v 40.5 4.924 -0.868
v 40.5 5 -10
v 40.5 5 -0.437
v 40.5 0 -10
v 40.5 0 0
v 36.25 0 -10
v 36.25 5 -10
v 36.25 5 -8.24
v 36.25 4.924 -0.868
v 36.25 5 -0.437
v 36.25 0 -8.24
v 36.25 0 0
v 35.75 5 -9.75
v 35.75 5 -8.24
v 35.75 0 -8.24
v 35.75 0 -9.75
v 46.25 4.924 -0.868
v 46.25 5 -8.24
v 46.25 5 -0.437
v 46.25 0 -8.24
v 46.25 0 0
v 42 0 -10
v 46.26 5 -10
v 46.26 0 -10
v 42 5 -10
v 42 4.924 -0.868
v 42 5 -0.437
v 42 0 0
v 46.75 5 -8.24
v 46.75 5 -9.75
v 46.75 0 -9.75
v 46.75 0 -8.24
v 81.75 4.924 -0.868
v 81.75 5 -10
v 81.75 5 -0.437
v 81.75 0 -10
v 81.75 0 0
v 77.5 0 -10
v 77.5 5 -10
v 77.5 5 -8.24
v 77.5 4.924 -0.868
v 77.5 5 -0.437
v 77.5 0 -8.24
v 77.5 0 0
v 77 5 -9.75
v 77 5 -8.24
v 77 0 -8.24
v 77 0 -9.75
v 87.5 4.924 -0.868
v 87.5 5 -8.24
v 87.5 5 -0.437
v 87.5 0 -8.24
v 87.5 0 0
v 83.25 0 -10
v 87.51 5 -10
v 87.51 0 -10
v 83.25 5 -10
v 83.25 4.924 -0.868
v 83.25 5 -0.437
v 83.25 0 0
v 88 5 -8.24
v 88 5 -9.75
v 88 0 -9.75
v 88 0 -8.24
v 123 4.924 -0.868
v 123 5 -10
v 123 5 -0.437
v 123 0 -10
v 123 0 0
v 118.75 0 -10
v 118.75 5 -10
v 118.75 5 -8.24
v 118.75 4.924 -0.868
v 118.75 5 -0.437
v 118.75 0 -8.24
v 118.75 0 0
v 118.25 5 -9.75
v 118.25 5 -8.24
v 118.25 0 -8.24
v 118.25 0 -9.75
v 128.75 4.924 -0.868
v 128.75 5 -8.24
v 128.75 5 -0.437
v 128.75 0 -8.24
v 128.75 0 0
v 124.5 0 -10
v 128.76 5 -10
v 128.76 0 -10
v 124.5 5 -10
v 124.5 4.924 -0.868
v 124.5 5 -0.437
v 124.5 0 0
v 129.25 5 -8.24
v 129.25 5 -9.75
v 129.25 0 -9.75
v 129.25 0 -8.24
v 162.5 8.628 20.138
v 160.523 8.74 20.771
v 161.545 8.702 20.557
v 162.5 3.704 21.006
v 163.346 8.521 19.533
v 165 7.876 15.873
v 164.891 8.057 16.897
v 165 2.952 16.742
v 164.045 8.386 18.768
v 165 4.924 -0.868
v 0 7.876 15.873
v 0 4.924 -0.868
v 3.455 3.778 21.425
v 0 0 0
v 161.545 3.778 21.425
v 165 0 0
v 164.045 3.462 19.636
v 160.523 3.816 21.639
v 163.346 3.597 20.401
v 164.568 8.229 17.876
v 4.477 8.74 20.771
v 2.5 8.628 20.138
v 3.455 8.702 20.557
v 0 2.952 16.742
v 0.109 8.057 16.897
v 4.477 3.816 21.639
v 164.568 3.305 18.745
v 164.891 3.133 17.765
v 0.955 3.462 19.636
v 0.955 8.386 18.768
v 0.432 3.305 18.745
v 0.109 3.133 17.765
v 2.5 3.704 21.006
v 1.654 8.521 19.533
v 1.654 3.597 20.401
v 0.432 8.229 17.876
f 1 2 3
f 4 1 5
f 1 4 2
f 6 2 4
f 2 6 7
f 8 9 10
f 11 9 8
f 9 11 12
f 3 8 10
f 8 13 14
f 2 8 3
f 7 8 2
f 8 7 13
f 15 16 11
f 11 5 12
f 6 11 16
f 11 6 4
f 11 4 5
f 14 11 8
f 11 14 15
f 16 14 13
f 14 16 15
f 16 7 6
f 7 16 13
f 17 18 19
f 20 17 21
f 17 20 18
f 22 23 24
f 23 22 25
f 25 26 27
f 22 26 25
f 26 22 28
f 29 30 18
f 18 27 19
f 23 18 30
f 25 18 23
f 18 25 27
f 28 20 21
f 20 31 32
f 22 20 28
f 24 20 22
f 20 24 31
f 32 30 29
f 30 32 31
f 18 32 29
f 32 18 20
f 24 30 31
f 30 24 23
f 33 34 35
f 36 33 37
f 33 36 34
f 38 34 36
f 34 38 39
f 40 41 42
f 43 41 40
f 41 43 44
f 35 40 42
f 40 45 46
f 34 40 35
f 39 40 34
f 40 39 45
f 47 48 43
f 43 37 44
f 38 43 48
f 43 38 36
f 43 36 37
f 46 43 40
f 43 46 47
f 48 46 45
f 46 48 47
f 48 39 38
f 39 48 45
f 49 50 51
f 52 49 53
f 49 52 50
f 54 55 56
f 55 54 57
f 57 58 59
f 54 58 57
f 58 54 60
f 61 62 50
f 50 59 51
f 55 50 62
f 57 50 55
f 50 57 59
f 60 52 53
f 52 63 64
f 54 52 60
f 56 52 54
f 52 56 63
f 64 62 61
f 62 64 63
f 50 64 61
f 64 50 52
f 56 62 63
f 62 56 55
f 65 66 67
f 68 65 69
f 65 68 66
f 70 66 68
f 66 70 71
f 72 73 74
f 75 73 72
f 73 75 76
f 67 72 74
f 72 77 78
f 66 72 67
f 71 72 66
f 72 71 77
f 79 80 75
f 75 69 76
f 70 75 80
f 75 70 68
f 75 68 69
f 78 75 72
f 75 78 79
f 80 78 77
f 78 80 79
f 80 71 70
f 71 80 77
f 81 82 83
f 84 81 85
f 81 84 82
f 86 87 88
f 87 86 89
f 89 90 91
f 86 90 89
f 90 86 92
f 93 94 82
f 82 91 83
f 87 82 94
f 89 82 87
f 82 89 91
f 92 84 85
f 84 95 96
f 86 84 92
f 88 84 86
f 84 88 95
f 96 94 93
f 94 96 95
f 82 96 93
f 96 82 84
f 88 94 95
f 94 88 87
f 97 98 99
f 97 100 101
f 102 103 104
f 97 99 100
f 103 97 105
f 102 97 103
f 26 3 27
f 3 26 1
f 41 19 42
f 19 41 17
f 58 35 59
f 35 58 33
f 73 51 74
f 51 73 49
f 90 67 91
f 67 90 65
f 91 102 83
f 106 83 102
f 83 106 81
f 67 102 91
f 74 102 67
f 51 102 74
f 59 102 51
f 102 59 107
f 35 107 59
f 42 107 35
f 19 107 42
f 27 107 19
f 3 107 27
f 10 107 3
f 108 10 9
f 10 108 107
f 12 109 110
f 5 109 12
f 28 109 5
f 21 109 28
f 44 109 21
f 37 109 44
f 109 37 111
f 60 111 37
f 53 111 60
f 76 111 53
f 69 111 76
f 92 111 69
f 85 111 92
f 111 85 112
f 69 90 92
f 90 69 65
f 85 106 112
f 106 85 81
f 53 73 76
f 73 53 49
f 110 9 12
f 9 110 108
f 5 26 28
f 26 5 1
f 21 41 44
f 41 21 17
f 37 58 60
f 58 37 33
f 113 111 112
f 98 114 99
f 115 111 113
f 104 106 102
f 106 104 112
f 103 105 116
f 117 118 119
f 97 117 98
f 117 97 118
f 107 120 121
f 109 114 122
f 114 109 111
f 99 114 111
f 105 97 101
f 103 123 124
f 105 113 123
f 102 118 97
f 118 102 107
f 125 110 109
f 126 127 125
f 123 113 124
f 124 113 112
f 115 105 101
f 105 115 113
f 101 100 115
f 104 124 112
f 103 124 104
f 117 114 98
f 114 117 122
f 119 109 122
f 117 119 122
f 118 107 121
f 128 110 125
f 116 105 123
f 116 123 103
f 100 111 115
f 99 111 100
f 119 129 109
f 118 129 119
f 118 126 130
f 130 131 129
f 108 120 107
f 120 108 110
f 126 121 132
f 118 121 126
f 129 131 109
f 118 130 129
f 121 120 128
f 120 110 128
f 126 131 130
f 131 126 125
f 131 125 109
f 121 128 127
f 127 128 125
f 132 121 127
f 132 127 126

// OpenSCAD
// file: config.scad
// ============================================
// Tempest Schachuhr - Gemeinsame Konfiguration
// ============================================
// Alle Masse in mm

// --- Druckbett-Limit ---
druckbett = 220; // Ender 3: 220x220mm

// --- FDM Toleranzen ---
tol = 0.25;       // Allgemeine Passtoleranz
tol_tight = 0.15; // Enge Passung (Snap-fit)
tol_loose = 0.35; // Lose Passung (leichtgaengig)

// --- Gesamtabmessungen Basis ---
basis_laenge = 210;
basis_breite = 100;
basis_hoehe  = 25;
basis_wand   = 4;       // Wandstaerke
basis_radius = 5;       // Kantenverrundung

// --- Pivot (Wippenlager) ---
pivot_radius    = 2;    // Halbrundes Profil
pivot_breite    = basis_breite - 2*basis_wand; // Steg laeuft von Wand zu Wand
pivot_hoehe_auf_basis = basis_hoehe - basis_wand; // Oberkante Basis-Innenwand

// --- Vorab-Definitionen (benoetigt fuer anschlag_hoehe) ---
wippe_nut_tiefe  = 2.5;
boden_dicke      = 2;

// --- Anschlaege ---
anschlag_abstand = 70;  // Abstand vom Pivot zum Anschlag (mm)
anschlag_breite  = 10;
anschlag_tiefe   = 4;
kipp_winkel      = 5;   // Max. Kippwinkel in Grad
// Berechnete Hoehe (vom Boden bis Kipp-Limit)
anschlag_hoehe   = (basis_hoehe + pivot_radius - wippe_nut_tiefe)
                   - anschlag_abstand * sin(kipp_winkel)
                   - boden_dicke;

// --- Wippe ---
wippe_kipp_freiraum = 1.5; // Extra Kuerzung pro Seite fuer Kippbewegung (mm)
wippe_laenge = basis_laenge - 2 * (basis_wand + tol_loose + wippe_kipp_freiraum);
wippe_breite = basis_breite - 2 * (basis_wand + tol_loose);
wippe_hoehe  = 8;
wippe_nut_radius = pivot_radius + tol; // V-Nut passend zum Pivot
fase_oben        = 1;           // 45°-Fase an Wippe-Oberkanten (Freiraum beim Kippen)

// --- Verstaerkung Wippe-Mitte (Buckel nach unten) ---
verstaerkung_breite = 30;  // Breite der Verdickung entlang X (um Pivot-Mitte)
verstaerkung_hoehe  = 4;   // Wie weit der Buckel nach unten ragt

// --- Smartphone-Schlitz ---
// Schlitz laeuft laengs entlang der X-Achse (wie beim Tempest-Original)
slot_laenge = 165;      // Laenge des Schlitzes (entlang X / Laengsachse)
slot_breite = 12;       // Breite des Schlitzes (entlang Y / Handy-Dicke)
slot_offset_y = 15;     // Schlitz-Versatz nach hinten (Y+) vom Zentrum
lehne_hoehe = 22;       // Rueckenlehne hinter dem Schlitz (Handy lehnt dagegen)
lehne_dicke = 5;        // Wandstaerke der Rueckenlehne
lehne_winkel = 10;      // Neigung nach hinten in Grad

// --- Lehne Steckverbindung (Spreizzapfen mit Rastnasen) ---
lehne_zapfen_laenge = 10;   // Zapfenlaenge in X (mm)
lehne_zapfen_tiefe  = 10;   // Gesamtlaenge Zapfen (laenger als Wippe fuer Snap)
lehne_zapfen_anzahl = 3;    // Anzahl Zapfen
lehne_zapfen_spalt  = 1.5;  // Spalt zwischen Zapfen-Haelften (mm)
lehne_zapfen_nub    = 0.5;  // Rastnase Ueberstand (mm)
lehne_zapfen_nub_h  = 1.5;  // Rastnase Hoehe (mm)

// --- Handy-Tasche (haengt unter der Wippe, wippt mit) ---
tasche_tiefe    = 12;   // Wie tief die Tasche unter der Wippe haengt
tasche_wand     = 2;    // Wandstaerke der Tasche
tasche_boden    = 2;    // Bodendicke im Schlitz (Handy steht darauf)

// --- Gummifuesse ---
fuss_durchmesser = 10;
fuss_hoehe       = 2;
fuss_abstand_x   = 15;  // Abstand vom Rand
fuss_abstand_y   = 15;

// --- Farben fuer Assembly ---
farbe_basis  = [0.3, 0.3, 0.3, 0.9];
farbe_wippe  = [0.6, 0.6, 0.7, 0.9];
farbe_lehne  = [0.8, 0.5, 0.3, 0.9];

// --- Hilfsvariable ---
$fn = 40; // Aufloesung fuer Rundungen
// main file
// ============================================
// Tempest Schachuhr - Teil 3: Lehne (Backrest)
// ============================================
// Rueckenlehne als Einzelteil zum Einstecken in die Wippe
// Spreizzapfen mit Rastnasen: kein Kleber noetig
// Zapfen sind gespalten, Nasen schnappen unter der Wippe ein

use <config.scad>
include <config.scad>

module lehne() {
    // Lehne-Form (nach hinten geneigt)
    rotate([-lehne_winkel, 0, 0])
        lehne_form(slot_laenge, lehne_dicke, lehne_hoehe, 5);

    // Spreizzapfen mit Rastnasen
    abstand = slot_laenge / (lehne_zapfen_anzahl + 1);
    halb = (lehne_zapfen_laenge - lehne_zapfen_spalt) / 2;

    for (i = [1:lehne_zapfen_anzahl]) {
        cx = i * abstand - lehne_zapfen_laenge / 2;

        // Linke Haelfte
        translate([cx, 0, -lehne_zapfen_tiefe])
            cube([halb, lehne_dicke, lehne_zapfen_tiefe]);
        // Linke Rastnase mit 45-Grad-Einfuehrrampe
        hull() {
            // Rampenspitze am Zapfenkoerper (unten, tritt zuerst ein)
            translate([cx, 0, -lehne_zapfen_tiefe])
                cube([0.01, lehne_dicke, 0.01]);
            // Volle Nasenbreite (Rampenende)
            translate([cx - lehne_zapfen_nub, 0,
                       -lehne_zapfen_tiefe + lehne_zapfen_nub/2])
                cube([lehne_zapfen_nub, lehne_dicke, 0.01]);
            // Nasenoberseite (Rastflaeche)
            translate([cx - lehne_zapfen_nub, 0,
                       -lehne_zapfen_tiefe + lehne_zapfen_nub/2 + lehne_zapfen_nub_h])
                cube([lehne_zapfen_nub, lehne_dicke, 0.01]);
        }

        // Rechte Haelfte
        translate([cx + halb + lehne_zapfen_spalt, 0, -lehne_zapfen_tiefe])
            cube([halb, lehne_dicke, lehne_zapfen_tiefe]);
        // Rechte Rastnase mit 45-Grad-Einfuehrrampe
        hull() {
            // Rampenspitze am Zapfenkoerper (unten, tritt zuerst ein)
            translate([cx + lehne_zapfen_laenge, 0, -lehne_zapfen_tiefe])
                cube([0.01, lehne_dicke, 0.01]);
            // Volle Nasenbreite (Rampenende)
            translate([cx + lehne_zapfen_laenge, 0,
                       -lehne_zapfen_tiefe + lehne_zapfen_nub/2])
                cube([lehne_zapfen_nub, lehne_dicke, 0.01]);
            // Nasenoberseite (Rastflaeche)
            translate([cx + lehne_zapfen_laenge, 0,
                       -lehne_zapfen_tiefe + lehne_zapfen_nub/2 + lehne_zapfen_nub_h])
                cube([lehne_zapfen_nub, lehne_dicke, 0.01]);
        }
    }
}

// --- Lehne mit abgerundeten oberen Ecken ---
module lehne_form(l, d, h, r) {
    hull() {
        cube([l, d, 0.01]);
        translate([r, 0, h - r])
            rotate([-90, 0, 0])
                cylinder(r=r, h=d, $fn=30);
        translate([l - r, 0, h - r])
            rotate([-90, 0, 0])
                cylinder(r=r, h=d, $fn=30);
    }
}

// Rendern
lehne();
